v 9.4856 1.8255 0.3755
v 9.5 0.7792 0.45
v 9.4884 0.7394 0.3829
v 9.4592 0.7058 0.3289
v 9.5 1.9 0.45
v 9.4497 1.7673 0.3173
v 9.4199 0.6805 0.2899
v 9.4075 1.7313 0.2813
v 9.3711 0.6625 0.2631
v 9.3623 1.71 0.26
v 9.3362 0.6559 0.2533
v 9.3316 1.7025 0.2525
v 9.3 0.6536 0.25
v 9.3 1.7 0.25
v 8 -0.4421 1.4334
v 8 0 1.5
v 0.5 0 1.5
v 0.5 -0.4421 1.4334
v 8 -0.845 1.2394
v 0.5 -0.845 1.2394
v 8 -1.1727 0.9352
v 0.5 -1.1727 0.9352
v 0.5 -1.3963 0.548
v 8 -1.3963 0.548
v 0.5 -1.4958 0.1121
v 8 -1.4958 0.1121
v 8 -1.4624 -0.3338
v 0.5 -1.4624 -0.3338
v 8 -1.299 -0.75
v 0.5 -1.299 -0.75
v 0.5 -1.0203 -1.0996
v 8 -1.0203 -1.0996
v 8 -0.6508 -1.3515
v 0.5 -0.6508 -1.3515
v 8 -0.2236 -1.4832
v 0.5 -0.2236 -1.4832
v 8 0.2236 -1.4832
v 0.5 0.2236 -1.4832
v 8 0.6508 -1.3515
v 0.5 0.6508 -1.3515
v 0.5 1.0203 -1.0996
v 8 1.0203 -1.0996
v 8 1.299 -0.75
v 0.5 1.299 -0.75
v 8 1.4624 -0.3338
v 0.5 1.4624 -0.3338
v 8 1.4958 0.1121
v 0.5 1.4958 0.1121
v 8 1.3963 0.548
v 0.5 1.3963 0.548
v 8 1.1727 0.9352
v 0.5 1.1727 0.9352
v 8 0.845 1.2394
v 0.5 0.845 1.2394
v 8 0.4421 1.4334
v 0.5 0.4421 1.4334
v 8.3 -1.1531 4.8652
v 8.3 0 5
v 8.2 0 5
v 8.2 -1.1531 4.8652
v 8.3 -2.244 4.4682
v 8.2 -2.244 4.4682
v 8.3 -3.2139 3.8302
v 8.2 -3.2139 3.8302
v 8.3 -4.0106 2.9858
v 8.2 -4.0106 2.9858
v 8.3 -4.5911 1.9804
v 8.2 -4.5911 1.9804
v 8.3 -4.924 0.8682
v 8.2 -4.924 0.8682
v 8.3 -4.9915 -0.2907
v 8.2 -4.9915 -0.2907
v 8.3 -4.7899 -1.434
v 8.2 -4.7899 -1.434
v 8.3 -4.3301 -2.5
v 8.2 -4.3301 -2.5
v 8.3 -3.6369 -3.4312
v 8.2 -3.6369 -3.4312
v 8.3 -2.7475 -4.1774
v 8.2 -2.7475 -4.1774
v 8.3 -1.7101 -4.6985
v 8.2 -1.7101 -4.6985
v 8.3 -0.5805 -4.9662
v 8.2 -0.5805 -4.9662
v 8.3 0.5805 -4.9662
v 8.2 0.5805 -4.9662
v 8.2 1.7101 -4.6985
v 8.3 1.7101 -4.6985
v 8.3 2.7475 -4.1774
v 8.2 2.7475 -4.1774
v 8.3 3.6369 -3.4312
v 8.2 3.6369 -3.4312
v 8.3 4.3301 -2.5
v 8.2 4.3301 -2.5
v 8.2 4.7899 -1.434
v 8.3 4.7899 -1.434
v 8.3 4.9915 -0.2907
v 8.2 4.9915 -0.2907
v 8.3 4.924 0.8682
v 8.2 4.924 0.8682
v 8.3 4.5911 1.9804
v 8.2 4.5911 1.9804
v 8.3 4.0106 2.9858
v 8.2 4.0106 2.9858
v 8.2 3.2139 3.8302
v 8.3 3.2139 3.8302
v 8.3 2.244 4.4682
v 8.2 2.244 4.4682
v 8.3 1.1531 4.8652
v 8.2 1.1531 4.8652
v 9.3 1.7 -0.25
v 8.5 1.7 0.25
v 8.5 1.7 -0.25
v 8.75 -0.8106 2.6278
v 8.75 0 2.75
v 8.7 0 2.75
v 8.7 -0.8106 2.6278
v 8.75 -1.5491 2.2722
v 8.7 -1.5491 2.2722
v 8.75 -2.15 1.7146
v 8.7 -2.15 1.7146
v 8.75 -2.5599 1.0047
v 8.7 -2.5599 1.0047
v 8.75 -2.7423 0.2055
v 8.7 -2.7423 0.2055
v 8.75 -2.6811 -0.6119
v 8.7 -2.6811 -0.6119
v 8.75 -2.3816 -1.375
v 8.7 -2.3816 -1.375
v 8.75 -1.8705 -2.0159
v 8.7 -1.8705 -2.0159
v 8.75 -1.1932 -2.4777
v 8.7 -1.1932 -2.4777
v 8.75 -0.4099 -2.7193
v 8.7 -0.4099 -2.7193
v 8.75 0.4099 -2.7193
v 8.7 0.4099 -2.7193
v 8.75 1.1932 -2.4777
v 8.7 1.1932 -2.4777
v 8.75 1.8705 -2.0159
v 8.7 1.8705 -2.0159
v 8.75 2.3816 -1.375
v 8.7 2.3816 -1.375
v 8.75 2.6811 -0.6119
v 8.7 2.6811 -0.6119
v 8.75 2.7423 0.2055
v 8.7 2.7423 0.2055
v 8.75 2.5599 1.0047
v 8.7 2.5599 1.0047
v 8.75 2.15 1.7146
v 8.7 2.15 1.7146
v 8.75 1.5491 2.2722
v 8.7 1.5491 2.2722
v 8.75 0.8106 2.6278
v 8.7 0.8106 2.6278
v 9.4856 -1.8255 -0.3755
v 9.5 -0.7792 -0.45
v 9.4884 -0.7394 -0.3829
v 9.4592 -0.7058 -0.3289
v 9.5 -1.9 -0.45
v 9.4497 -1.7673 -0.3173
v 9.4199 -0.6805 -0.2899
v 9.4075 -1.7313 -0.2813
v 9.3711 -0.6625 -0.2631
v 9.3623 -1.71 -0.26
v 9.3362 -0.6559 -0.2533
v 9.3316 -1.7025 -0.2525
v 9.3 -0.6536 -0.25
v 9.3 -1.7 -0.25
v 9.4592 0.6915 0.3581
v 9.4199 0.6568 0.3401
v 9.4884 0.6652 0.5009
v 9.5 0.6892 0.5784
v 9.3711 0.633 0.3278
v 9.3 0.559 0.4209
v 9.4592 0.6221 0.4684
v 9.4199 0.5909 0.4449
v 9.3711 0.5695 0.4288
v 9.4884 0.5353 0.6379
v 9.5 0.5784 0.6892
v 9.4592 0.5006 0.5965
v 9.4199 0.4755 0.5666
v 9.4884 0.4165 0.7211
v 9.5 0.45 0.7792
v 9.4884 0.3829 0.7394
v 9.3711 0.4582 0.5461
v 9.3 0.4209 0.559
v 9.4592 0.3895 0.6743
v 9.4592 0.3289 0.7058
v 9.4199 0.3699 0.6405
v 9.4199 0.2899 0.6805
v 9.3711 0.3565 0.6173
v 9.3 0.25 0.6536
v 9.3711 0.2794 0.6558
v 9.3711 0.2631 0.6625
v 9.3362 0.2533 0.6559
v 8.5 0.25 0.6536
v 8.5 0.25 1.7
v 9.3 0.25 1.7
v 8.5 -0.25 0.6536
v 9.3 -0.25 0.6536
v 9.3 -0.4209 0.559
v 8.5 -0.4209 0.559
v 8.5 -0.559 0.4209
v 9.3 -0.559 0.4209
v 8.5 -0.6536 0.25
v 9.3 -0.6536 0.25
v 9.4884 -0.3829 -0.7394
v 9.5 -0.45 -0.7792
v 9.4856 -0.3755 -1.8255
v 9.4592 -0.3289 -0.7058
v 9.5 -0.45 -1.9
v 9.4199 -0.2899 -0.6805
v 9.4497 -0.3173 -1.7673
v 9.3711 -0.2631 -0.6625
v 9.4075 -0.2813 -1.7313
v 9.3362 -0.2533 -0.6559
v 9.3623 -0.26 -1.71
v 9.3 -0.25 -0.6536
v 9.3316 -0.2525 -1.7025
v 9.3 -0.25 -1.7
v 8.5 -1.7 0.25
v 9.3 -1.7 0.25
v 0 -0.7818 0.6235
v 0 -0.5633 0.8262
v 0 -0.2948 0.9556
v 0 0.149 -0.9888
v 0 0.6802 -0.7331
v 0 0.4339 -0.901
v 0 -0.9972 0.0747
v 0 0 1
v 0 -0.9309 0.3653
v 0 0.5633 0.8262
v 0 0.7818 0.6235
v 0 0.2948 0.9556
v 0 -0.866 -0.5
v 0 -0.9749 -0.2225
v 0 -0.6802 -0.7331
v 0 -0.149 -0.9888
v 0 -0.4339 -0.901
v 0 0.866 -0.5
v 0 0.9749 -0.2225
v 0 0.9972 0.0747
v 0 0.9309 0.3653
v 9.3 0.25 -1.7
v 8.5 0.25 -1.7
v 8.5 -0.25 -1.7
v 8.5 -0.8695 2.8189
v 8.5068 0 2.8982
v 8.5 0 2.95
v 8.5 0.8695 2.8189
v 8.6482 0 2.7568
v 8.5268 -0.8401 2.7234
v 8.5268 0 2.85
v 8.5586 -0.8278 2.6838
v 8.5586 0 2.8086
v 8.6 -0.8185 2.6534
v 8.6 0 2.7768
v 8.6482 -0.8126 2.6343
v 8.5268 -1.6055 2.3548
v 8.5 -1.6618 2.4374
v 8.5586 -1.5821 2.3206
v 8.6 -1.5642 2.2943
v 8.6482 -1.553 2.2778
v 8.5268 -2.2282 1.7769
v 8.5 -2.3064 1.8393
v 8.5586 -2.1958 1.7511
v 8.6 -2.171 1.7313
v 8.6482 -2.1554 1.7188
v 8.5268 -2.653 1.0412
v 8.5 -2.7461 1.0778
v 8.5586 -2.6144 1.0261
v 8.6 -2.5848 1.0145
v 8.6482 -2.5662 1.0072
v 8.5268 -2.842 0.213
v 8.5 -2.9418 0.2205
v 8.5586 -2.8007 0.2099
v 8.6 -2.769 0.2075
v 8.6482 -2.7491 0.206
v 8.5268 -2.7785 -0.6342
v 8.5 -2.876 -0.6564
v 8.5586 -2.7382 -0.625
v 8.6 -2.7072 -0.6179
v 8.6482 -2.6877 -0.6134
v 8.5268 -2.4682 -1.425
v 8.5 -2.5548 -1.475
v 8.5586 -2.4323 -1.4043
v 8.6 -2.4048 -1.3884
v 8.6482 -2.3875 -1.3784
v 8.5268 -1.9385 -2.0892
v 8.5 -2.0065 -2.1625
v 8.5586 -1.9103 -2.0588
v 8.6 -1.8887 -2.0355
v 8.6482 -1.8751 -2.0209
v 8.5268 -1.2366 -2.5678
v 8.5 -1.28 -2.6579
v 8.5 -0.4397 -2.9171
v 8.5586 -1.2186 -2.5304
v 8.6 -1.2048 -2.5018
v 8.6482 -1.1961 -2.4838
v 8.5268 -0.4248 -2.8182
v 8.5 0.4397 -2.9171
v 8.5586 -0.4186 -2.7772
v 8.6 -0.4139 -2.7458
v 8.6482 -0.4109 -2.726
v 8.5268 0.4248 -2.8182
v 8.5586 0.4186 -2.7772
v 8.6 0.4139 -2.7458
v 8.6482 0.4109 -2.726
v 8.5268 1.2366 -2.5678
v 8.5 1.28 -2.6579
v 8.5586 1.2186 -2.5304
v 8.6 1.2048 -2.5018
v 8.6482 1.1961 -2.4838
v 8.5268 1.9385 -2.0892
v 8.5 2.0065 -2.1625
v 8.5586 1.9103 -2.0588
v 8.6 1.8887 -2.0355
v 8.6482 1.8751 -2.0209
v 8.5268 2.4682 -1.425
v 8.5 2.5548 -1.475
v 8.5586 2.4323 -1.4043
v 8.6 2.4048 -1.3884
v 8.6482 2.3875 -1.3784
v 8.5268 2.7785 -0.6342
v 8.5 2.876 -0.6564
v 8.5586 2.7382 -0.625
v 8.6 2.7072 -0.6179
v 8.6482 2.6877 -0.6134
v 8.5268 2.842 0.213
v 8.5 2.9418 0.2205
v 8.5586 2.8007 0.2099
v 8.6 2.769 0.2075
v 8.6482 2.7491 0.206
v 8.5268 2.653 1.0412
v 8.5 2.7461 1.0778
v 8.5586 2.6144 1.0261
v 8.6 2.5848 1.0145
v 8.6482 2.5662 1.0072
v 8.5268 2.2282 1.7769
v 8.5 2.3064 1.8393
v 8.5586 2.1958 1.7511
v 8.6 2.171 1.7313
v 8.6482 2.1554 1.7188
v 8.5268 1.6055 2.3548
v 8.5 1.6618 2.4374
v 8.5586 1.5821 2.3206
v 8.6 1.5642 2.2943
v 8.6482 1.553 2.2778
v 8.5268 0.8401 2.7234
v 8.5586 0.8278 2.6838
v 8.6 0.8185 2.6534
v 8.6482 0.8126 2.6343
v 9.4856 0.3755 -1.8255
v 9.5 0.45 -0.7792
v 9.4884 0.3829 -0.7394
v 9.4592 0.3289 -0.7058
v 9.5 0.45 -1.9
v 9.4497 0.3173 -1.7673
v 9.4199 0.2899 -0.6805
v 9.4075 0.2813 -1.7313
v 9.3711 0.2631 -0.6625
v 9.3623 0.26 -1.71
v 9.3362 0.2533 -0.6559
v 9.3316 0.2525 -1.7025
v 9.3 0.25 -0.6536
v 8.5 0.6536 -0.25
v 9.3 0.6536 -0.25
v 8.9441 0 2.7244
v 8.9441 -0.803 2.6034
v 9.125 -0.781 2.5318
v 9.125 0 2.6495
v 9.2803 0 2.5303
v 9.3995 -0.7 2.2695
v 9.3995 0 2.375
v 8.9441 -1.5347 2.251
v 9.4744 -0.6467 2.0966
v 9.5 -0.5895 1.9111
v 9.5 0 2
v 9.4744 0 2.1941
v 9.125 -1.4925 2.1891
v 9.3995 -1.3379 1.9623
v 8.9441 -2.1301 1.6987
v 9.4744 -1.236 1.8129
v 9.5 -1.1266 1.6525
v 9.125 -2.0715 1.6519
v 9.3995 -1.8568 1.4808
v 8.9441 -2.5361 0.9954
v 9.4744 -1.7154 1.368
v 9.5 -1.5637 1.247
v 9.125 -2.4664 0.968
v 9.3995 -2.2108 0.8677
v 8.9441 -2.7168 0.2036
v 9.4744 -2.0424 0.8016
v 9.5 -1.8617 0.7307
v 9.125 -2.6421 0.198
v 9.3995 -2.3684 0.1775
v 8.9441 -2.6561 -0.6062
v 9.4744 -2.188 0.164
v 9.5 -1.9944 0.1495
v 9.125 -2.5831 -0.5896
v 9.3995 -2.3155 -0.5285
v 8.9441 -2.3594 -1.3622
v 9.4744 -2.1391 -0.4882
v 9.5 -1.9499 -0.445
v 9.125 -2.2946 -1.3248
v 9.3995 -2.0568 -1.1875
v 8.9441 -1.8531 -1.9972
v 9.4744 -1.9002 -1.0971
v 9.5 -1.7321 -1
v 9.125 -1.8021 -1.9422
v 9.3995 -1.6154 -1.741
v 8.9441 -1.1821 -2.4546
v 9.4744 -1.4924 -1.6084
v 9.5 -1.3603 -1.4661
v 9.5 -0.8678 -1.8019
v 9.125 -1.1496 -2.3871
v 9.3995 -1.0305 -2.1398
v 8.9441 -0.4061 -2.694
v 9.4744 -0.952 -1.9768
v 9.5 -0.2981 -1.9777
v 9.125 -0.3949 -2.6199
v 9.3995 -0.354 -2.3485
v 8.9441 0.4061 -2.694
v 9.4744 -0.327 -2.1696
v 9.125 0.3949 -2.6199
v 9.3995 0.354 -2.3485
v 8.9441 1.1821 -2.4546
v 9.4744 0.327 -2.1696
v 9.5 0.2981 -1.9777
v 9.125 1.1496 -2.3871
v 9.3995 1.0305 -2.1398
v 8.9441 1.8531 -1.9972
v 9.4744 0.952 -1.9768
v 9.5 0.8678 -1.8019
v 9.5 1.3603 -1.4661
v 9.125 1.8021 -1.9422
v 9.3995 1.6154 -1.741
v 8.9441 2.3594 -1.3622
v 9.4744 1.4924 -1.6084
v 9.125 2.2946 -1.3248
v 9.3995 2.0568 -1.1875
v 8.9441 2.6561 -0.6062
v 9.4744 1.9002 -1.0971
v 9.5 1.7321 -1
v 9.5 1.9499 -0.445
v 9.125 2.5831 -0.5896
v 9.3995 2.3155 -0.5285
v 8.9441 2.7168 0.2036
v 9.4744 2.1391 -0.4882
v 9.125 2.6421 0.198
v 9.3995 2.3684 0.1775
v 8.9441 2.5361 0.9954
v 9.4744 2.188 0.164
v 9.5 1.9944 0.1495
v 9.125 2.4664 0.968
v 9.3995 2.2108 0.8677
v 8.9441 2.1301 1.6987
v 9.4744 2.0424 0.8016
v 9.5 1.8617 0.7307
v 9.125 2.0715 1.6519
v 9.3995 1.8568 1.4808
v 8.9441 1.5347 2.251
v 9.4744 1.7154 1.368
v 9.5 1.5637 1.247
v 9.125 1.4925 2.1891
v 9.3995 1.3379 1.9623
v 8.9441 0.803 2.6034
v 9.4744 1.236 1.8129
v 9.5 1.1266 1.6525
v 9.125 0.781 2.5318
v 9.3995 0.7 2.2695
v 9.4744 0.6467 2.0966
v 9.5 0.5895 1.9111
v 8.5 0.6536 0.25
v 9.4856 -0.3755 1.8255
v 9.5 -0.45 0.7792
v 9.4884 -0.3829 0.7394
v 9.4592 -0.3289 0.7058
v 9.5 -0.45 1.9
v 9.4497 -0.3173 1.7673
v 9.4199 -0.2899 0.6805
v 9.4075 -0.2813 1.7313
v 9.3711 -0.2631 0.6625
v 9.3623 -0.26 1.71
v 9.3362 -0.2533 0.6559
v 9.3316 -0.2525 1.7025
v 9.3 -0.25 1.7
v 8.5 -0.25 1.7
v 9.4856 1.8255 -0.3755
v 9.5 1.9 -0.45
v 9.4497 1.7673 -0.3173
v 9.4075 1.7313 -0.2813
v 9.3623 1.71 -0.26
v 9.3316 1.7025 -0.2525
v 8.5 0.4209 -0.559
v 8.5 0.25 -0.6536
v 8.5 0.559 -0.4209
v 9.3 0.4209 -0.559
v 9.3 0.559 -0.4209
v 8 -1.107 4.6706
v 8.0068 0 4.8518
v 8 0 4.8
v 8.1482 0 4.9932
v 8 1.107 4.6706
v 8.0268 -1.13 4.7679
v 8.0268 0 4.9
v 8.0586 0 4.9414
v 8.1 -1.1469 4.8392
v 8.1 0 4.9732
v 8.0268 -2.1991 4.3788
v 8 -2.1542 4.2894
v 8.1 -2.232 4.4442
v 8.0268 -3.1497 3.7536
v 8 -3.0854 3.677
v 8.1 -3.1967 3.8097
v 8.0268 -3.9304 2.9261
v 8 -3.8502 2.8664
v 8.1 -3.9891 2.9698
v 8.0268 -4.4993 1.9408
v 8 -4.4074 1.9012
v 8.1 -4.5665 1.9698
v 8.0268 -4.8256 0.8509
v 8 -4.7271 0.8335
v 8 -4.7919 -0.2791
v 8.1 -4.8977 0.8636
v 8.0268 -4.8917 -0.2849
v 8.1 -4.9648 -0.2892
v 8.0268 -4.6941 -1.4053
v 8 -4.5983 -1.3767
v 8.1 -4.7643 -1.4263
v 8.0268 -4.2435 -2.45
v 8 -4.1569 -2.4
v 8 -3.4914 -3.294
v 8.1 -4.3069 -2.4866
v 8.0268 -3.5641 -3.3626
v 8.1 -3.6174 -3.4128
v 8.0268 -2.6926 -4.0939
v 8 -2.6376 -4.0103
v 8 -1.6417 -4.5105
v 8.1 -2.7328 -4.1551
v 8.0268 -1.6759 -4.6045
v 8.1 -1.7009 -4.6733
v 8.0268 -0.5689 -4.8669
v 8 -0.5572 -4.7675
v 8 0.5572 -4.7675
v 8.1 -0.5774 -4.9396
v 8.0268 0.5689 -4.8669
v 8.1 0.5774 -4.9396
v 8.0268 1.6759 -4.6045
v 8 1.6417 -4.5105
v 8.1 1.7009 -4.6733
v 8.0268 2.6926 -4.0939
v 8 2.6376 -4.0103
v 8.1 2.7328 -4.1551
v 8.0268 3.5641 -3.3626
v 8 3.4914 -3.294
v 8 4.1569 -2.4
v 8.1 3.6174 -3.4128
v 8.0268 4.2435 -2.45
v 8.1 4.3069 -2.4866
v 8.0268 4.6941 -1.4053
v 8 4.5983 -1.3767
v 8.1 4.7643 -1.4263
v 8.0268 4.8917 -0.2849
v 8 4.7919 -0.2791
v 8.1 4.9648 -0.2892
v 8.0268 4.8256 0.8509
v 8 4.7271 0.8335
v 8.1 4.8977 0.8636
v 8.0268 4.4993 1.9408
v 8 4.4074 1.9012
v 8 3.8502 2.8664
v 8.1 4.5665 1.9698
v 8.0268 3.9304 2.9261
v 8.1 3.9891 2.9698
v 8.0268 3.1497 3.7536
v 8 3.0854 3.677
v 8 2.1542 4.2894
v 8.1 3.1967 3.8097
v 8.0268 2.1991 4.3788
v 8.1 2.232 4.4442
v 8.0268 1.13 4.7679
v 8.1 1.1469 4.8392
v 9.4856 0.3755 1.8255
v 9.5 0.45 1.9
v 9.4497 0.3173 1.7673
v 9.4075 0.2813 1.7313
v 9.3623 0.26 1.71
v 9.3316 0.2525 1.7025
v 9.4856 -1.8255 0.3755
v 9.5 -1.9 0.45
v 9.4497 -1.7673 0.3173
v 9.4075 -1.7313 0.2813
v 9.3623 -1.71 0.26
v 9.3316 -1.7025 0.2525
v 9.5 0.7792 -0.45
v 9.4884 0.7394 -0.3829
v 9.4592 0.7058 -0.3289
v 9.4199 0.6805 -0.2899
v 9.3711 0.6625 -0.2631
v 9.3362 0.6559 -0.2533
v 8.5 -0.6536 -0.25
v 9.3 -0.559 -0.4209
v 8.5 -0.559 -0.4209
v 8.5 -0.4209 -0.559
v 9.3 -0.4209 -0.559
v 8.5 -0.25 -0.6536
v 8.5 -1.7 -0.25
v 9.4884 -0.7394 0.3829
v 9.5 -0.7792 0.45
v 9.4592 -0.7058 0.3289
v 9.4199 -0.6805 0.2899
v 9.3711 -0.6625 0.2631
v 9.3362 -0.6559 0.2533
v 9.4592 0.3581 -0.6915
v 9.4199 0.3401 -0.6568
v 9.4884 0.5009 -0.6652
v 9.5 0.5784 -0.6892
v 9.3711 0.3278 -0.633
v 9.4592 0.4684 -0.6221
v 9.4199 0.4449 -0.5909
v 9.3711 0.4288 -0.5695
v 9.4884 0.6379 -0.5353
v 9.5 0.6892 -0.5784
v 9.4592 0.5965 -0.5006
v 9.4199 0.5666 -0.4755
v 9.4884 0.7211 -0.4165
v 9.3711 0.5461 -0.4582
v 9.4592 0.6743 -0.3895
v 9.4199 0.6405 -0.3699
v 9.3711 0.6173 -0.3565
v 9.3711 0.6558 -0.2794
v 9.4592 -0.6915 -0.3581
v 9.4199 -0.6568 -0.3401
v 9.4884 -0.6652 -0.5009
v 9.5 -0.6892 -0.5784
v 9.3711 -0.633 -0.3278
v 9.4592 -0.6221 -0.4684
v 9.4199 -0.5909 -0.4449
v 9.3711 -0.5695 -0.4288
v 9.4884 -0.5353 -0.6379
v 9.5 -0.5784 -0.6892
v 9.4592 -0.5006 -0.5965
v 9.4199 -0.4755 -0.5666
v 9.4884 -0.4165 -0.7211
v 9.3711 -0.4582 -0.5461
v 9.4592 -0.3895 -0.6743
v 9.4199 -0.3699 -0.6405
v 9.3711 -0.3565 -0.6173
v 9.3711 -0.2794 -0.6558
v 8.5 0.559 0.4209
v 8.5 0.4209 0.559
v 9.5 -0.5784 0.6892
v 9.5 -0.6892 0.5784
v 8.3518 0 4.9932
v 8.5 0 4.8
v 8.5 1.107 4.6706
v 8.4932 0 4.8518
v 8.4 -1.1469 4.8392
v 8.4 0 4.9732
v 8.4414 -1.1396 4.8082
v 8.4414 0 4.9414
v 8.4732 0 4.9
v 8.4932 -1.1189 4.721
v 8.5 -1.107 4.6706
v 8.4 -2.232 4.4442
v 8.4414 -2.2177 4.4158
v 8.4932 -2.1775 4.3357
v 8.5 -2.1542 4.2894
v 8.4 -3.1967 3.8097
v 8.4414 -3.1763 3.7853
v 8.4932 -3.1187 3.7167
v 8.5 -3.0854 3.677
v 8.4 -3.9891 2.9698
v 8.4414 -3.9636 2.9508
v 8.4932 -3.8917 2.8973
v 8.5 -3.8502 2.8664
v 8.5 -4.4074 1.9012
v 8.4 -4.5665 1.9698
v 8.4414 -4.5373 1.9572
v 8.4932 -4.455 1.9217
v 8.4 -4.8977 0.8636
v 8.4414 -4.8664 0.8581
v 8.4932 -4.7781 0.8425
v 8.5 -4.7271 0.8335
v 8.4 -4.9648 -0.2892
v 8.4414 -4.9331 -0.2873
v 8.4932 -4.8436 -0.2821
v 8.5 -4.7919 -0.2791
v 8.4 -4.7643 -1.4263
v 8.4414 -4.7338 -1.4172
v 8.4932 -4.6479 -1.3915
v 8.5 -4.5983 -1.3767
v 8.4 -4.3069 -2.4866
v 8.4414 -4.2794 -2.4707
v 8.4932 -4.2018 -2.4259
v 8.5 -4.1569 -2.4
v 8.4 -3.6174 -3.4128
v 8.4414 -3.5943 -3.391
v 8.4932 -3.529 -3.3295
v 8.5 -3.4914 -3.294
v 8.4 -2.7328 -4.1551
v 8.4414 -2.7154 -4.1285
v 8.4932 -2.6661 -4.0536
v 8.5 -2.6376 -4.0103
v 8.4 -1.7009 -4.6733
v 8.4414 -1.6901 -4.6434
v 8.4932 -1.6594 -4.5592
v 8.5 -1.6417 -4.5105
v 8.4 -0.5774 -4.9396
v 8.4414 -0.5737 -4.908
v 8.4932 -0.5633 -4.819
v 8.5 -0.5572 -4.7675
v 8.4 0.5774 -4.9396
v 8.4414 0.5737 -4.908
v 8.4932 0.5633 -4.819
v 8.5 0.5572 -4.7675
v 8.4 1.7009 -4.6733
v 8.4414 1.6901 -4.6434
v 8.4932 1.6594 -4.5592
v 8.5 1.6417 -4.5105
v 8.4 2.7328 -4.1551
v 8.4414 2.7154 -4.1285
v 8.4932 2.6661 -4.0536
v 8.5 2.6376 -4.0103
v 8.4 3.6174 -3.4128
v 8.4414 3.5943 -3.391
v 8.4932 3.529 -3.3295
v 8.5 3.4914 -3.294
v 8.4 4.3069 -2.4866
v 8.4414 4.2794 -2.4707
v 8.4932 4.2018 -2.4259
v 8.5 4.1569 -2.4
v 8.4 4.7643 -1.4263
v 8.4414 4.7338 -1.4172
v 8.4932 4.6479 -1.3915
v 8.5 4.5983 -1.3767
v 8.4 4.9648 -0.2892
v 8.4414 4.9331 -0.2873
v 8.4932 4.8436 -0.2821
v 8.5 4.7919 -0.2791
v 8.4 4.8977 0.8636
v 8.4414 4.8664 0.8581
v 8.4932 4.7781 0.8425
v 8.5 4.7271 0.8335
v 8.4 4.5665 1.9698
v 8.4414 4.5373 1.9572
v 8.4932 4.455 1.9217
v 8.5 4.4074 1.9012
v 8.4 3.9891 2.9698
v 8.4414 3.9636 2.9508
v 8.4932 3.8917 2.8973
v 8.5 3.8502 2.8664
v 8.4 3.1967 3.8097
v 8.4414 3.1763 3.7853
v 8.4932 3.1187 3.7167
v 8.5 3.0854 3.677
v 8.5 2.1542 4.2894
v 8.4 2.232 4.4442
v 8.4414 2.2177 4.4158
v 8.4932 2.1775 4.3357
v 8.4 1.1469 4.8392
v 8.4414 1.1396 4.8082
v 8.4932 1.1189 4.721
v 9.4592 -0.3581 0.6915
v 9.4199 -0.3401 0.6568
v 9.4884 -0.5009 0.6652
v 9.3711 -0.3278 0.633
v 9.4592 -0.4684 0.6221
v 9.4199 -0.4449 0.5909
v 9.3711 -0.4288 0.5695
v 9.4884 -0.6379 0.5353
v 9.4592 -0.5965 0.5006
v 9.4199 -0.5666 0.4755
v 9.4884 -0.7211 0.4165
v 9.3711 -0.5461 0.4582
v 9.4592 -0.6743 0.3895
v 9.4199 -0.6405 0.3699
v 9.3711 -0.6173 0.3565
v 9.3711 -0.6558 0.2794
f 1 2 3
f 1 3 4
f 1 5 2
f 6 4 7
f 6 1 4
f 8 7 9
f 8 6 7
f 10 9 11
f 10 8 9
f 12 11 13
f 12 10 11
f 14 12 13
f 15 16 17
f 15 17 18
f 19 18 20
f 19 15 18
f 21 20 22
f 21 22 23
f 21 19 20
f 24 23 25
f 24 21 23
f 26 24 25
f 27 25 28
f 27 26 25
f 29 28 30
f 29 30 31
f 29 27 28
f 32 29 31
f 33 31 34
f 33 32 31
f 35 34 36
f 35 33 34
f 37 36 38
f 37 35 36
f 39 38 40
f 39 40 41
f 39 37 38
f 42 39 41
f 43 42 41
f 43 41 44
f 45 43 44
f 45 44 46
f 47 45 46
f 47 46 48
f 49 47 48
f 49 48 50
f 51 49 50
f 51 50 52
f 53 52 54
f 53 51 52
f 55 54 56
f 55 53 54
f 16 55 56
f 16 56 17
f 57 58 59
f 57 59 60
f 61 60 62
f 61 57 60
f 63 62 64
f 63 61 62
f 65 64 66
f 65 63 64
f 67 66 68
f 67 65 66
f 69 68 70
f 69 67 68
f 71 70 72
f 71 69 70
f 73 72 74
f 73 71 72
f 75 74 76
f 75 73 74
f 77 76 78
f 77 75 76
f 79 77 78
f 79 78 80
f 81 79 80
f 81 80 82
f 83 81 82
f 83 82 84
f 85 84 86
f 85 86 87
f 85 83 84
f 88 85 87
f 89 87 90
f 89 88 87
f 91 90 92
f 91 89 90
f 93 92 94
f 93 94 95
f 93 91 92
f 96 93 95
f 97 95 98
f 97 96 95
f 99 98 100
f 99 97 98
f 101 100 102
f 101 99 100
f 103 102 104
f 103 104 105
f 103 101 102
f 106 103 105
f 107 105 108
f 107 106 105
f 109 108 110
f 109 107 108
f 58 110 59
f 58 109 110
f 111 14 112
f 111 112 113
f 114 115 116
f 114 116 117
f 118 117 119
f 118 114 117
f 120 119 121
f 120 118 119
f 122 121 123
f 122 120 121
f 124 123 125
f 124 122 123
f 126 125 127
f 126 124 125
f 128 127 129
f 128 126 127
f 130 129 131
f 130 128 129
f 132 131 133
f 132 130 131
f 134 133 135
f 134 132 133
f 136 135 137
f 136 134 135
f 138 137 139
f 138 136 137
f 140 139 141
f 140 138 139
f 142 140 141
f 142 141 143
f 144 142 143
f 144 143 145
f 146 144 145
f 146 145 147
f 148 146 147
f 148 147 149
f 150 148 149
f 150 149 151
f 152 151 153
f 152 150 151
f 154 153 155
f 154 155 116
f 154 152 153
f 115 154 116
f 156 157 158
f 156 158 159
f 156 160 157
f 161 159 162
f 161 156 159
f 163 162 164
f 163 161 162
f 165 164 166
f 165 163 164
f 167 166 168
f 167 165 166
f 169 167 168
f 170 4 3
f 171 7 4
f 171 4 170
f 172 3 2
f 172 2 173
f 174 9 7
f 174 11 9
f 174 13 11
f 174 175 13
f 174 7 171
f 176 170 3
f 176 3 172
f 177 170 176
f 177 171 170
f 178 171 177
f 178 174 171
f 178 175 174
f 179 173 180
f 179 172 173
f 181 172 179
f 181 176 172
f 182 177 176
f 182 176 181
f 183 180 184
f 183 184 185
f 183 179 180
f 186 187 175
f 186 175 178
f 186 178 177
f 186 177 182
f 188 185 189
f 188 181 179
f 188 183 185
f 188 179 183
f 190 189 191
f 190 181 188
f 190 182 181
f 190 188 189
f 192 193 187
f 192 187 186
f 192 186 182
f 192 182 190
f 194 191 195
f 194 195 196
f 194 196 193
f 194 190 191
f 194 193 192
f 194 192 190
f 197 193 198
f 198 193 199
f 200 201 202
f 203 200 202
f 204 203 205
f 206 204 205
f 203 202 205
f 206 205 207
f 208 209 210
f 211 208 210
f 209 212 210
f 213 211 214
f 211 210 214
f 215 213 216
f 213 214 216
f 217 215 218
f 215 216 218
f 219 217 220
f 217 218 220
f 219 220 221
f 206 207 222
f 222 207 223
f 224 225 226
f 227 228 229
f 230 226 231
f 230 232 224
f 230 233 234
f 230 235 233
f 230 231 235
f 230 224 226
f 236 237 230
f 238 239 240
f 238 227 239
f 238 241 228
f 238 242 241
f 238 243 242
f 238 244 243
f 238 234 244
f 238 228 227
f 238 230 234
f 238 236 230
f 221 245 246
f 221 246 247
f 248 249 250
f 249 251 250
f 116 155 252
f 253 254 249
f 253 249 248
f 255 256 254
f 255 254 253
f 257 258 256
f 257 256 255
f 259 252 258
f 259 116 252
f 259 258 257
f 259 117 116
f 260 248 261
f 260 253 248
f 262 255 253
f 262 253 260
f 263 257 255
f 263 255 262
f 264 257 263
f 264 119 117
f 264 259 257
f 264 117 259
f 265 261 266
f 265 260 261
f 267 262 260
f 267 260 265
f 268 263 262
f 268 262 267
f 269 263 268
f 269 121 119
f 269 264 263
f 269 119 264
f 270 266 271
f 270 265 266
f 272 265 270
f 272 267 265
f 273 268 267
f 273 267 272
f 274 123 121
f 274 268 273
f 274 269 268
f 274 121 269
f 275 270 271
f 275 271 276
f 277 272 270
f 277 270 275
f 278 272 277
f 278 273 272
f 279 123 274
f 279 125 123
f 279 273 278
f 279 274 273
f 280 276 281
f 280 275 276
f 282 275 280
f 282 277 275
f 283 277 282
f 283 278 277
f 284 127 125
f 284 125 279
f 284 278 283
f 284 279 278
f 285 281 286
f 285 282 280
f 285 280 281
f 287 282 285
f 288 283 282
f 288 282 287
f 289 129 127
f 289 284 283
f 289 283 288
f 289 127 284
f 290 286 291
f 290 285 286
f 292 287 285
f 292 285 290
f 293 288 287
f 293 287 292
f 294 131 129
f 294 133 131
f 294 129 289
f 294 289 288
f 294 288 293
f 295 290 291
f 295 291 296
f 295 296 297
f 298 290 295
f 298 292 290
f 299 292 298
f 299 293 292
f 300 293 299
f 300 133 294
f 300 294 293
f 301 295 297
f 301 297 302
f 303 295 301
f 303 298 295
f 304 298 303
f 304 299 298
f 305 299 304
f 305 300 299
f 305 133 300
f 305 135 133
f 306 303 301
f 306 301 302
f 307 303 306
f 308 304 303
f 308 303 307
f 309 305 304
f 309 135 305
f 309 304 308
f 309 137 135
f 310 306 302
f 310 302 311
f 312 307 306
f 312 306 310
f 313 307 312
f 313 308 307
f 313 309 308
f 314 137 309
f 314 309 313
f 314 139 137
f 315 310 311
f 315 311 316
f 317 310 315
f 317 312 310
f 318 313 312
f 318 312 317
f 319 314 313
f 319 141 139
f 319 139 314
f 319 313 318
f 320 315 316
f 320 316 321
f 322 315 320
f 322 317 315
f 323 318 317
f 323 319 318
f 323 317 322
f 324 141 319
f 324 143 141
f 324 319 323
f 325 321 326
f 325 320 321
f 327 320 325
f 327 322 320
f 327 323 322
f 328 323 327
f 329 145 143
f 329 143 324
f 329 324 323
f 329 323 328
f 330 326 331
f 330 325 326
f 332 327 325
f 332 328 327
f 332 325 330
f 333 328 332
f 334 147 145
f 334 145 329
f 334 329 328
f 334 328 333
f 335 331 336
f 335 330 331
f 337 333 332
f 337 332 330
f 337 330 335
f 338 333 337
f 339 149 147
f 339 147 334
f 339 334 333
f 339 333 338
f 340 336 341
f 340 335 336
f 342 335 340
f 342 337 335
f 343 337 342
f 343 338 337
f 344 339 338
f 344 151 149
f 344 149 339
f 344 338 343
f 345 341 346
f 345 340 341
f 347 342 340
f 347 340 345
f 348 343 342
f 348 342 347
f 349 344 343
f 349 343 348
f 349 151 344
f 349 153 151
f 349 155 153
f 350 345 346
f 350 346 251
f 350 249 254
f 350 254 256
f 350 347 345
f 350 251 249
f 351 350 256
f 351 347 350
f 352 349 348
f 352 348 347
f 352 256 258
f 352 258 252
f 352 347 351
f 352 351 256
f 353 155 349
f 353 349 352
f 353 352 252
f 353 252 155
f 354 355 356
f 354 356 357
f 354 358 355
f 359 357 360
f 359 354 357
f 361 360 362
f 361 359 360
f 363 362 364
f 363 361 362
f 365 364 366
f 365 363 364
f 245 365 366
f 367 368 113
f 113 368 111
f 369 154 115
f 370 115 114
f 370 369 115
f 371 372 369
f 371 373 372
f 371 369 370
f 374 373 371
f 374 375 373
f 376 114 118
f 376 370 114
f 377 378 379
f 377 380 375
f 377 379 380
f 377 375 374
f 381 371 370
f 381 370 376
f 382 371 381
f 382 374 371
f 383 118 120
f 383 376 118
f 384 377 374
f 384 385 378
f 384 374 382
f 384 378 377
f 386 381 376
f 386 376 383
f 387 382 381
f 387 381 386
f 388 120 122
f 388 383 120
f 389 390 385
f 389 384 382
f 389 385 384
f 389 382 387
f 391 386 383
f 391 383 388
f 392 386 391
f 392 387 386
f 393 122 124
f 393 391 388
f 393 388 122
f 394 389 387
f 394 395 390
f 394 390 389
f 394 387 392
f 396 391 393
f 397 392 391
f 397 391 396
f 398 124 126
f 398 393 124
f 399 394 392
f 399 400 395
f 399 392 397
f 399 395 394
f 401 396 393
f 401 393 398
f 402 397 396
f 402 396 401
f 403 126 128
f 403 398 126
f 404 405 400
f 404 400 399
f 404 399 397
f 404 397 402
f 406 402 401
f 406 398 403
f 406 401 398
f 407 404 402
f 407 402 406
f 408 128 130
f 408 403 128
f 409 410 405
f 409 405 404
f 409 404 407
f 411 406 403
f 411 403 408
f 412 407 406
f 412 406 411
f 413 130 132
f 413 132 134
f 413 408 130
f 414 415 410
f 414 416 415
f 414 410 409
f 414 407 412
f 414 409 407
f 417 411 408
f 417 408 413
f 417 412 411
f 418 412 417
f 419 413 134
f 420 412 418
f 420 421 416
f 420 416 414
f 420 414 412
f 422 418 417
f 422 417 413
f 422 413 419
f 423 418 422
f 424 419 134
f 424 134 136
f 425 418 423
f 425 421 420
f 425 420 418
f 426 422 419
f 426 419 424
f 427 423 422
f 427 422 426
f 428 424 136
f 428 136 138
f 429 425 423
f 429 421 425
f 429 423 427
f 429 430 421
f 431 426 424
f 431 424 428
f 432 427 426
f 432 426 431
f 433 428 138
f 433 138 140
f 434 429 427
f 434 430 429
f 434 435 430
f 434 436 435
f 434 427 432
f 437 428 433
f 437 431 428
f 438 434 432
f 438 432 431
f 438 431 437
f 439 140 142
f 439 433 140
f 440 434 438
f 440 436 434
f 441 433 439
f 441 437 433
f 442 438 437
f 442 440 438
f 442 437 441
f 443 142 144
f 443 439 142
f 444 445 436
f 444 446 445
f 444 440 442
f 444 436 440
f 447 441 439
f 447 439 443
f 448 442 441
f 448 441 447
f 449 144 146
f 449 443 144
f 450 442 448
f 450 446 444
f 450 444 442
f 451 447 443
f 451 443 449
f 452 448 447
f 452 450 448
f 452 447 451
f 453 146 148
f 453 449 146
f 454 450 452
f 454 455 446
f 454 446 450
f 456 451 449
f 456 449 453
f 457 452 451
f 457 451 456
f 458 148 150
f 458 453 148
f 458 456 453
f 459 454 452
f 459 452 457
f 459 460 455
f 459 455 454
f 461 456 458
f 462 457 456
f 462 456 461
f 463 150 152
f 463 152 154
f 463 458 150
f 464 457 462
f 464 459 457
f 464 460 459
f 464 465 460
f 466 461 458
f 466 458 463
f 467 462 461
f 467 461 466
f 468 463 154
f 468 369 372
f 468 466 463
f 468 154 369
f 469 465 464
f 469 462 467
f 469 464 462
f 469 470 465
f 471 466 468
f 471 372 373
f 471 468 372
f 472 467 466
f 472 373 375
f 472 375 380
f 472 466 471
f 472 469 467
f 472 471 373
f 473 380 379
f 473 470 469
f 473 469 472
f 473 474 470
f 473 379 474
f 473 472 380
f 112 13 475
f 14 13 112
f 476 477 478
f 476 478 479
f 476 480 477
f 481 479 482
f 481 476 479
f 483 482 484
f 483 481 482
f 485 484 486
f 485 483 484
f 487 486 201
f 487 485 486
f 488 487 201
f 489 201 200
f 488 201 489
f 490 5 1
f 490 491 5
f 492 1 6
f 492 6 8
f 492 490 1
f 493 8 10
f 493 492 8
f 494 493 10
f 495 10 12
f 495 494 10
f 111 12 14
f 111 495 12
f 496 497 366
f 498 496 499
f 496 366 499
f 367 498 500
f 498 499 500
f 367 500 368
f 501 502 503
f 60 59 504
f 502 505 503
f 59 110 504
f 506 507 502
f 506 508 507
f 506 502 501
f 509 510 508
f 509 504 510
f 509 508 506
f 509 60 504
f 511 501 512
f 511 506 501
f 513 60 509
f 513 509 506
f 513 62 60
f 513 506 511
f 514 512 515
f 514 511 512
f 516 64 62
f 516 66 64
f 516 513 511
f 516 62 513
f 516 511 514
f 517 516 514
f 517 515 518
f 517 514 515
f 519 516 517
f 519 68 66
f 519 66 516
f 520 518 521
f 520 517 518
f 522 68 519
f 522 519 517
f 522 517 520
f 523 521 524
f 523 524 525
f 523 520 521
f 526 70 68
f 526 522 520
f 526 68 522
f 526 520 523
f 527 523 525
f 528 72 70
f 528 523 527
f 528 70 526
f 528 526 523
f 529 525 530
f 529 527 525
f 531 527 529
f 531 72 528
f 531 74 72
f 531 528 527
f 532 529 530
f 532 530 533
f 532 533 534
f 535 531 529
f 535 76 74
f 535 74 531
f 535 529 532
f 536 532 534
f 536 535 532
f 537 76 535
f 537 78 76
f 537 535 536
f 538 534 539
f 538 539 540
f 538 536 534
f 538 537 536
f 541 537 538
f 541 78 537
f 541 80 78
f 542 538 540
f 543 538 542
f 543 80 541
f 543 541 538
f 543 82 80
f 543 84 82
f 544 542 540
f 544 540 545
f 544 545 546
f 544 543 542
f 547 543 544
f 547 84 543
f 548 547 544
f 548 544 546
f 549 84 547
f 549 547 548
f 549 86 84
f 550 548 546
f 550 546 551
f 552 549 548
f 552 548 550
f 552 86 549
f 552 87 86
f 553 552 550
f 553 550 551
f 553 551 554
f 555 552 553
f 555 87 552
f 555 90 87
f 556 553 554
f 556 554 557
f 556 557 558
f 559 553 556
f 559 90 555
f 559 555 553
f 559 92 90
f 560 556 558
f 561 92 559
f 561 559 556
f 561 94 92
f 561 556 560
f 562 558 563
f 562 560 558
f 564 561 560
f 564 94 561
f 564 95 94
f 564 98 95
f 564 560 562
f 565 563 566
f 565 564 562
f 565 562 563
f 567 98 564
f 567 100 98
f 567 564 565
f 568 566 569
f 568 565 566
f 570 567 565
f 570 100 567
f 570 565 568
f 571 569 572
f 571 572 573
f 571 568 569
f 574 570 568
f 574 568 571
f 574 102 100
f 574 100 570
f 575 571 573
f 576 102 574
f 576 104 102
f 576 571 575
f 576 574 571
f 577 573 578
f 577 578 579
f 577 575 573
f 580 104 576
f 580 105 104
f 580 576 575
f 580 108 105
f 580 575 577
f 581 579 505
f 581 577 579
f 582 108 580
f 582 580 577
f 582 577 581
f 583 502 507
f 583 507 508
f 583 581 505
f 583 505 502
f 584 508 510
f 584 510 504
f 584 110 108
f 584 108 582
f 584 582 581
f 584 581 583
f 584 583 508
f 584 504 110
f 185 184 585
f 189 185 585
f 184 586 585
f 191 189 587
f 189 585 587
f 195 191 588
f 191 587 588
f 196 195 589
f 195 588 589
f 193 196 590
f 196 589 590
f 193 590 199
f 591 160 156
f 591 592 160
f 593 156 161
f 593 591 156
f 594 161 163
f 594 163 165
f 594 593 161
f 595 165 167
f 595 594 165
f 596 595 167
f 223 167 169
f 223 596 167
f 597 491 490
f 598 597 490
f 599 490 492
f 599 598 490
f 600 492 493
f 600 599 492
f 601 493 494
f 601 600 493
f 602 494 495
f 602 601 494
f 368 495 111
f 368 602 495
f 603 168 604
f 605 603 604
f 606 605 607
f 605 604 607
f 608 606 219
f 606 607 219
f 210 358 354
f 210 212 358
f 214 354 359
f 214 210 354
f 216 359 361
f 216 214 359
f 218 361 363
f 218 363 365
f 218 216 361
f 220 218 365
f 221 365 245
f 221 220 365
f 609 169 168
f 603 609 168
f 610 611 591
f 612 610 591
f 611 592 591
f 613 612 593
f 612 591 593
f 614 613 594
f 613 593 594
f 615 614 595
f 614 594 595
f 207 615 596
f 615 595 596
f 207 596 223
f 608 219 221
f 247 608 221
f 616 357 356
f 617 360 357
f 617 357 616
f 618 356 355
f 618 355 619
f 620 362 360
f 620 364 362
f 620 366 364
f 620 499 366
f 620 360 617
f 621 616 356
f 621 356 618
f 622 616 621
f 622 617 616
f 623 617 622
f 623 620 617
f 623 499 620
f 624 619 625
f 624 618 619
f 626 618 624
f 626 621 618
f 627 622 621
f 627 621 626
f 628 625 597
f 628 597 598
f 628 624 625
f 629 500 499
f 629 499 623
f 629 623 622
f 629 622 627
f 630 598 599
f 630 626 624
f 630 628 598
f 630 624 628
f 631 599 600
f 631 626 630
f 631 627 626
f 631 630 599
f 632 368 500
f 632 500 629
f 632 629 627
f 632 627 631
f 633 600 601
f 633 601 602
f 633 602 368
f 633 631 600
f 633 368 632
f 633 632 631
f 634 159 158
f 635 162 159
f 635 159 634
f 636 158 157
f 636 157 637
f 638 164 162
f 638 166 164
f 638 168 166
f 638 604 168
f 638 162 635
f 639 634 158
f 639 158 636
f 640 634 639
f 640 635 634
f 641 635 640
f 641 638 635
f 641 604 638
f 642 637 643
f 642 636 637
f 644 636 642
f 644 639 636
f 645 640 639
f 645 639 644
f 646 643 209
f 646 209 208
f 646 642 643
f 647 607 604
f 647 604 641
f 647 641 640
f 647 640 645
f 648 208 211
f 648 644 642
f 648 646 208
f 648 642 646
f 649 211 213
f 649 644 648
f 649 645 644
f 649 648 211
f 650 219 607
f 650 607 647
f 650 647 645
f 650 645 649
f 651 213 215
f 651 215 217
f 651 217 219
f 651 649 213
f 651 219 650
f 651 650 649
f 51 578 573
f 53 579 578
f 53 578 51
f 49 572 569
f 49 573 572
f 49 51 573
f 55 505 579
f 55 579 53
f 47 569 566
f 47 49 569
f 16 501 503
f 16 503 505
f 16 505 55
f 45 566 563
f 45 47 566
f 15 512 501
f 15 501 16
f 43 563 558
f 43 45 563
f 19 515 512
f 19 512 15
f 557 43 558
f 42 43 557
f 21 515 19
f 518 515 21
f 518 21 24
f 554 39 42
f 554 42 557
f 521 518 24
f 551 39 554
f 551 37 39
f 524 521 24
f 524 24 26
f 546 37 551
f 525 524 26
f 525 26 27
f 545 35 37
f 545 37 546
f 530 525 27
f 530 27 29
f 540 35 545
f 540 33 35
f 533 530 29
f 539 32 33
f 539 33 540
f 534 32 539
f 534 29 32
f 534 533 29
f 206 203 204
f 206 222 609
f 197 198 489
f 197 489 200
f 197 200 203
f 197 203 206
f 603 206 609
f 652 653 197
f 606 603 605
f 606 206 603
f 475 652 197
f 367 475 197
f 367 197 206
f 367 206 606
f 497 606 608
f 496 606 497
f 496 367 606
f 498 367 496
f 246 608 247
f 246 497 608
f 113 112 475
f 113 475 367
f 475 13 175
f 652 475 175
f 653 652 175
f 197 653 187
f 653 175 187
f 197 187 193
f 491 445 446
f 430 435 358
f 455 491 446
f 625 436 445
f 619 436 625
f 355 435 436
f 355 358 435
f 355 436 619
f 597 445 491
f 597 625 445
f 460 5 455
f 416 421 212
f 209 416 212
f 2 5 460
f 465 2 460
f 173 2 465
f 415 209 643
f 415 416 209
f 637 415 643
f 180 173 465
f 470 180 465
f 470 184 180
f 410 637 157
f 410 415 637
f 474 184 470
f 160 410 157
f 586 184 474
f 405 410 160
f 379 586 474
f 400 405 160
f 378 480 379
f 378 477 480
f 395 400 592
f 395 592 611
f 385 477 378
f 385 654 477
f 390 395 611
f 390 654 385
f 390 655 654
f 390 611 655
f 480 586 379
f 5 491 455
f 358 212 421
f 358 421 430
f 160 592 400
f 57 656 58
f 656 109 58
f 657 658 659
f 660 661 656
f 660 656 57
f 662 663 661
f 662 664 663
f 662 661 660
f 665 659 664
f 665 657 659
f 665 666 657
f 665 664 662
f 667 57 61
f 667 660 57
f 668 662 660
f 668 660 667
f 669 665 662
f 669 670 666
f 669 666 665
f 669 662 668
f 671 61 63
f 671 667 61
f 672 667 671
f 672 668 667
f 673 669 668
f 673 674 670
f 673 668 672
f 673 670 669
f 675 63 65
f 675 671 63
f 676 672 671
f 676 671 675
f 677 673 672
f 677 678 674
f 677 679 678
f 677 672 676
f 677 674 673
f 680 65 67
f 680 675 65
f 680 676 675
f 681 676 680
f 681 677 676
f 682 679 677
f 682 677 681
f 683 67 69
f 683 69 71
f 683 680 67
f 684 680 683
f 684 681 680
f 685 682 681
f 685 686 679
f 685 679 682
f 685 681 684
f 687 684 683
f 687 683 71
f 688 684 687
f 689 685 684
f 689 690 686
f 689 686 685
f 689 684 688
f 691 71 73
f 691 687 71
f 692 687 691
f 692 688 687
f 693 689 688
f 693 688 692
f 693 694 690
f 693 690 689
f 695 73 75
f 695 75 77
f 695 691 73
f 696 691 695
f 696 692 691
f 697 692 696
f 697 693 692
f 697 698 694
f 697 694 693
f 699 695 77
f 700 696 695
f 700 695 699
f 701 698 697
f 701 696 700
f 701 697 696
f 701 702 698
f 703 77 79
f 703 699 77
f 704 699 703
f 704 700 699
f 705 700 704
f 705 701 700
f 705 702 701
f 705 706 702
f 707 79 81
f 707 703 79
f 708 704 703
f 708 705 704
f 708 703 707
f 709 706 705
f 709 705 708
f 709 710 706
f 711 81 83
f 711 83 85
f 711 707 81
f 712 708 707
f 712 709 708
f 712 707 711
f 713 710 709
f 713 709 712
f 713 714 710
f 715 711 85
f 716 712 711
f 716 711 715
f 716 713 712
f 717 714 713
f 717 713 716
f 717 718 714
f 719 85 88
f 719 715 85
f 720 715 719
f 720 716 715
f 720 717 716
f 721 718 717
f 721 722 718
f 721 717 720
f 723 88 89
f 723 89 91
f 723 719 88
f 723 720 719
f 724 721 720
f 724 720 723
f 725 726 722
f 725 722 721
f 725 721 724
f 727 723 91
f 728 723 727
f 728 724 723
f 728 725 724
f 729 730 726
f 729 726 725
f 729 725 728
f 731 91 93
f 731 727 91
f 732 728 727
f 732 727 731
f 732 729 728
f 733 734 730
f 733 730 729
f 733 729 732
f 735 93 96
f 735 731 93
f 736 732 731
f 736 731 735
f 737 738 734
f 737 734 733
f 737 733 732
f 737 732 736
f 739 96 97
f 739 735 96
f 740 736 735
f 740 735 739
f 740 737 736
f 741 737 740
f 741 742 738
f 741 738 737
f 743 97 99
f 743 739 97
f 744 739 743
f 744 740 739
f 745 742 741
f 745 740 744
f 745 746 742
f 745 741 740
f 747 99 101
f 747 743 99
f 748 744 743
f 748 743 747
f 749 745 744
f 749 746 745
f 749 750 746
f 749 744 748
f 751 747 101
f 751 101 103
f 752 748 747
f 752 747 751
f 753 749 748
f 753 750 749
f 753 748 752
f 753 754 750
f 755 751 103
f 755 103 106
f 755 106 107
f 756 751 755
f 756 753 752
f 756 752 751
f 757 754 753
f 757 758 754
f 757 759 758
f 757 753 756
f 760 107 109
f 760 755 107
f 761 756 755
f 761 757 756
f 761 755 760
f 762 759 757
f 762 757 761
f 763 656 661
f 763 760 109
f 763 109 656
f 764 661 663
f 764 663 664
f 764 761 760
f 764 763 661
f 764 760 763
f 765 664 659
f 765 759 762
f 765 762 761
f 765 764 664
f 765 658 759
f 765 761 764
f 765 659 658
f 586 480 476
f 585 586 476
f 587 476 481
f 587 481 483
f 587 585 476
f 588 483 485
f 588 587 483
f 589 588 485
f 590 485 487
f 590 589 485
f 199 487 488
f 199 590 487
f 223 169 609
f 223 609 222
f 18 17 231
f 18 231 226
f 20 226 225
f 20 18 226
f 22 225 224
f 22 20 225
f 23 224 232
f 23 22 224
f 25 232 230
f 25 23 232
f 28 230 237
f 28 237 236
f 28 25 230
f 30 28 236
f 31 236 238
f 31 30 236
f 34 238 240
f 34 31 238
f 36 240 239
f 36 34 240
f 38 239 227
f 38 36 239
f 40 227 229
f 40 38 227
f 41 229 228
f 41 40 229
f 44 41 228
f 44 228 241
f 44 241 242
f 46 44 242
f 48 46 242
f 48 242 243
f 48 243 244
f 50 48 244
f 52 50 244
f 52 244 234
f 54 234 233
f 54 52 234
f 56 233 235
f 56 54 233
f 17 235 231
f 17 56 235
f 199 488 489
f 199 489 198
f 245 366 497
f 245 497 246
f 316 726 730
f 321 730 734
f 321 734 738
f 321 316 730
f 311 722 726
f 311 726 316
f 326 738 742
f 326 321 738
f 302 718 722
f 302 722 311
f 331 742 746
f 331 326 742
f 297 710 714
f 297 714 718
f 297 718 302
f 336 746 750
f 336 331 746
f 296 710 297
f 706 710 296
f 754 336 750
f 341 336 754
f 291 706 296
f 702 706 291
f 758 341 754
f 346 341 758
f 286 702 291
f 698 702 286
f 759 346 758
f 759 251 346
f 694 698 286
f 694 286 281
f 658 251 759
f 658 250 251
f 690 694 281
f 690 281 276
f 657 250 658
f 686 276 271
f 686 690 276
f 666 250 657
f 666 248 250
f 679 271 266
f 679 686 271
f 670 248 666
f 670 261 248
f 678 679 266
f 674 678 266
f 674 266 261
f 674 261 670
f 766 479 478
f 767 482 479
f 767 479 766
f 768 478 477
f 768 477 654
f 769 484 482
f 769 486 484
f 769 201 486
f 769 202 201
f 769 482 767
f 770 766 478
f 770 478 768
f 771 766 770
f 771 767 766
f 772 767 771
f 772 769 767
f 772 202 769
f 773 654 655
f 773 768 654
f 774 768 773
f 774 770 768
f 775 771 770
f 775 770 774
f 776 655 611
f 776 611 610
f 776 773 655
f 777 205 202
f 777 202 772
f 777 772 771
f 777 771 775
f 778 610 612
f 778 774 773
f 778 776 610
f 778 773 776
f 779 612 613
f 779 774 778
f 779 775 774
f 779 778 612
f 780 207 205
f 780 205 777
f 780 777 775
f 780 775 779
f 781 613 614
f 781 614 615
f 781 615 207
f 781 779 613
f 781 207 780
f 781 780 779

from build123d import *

# Parameters (mm, degrees)
ESQUISSE2_W                  = 0.5
ESQUISSE2_H                  = 1.7
ENL_V_MAT_EXTRU_1_DEPTH      = 1
R_P_TITION_CIRCULAIRE1_COUNT = 4
ESQUISSE3_R                  = 0.699771755
ENL_V_MAT_EXTRU_2_DEPTH      = 1
CHANFREIN1_SIZE              = 0.5
CONG_1_R                     = 0.2


with BuildPart() as part:
    # Esquisse1 → Révolution1 (revolve)
    with BuildSketch(Plane.XY, mode=Mode.PRIVATE) as r_volution1_sk:
        with BuildLine():
            Line((0, 0), (0, 1.5))
            Line((0, 1.5), (8, 1.5))
            Line((8, 1.5), (8, 5))
            Line((8, 5), (8.5, 5))
            Line((8.5, 5), (8.5, 2.75))
            Line((8.5, 2.75), (8.75, 2.75))
            ThreePointArc((8.75, 2.75), (9.280330086, 2.530330086), (9.5, 2))
            Line((9.5, 2), (9.5, 0))
            Line((9.5, 0), (0, 0))
        make_face()
    revolve(r_volution1_sk.sketch.rotate(Axis((0, 0, 0), (1, 0, 0)), 90), axis=Axis((0, 0, 0), (1, 0, 0)))

    # Esquisse2 → Enlèv. mat.-Extru.1 (cut)
    with BuildSketch(Plane(origin=(9.5, 0, 0), x_dir=(0, 0, -1), z_dir=(1, 0, 0))):
        with Locations((0, 0.85)):
            Rectangle(ESQUISSE2_W, ESQUISSE2_H)
    enl_v_mat_extru_1 = extrude(amount=-ENL_V_MAT_EXTRU_1_DEPTH, mode=Mode.SUBTRACT)

    # Répétition circulaire1: Enlèv. mat.-Extru.1 ×4 about axis
    r_p_tition_circulaire1_axis = Axis((0, 0, 0), (1, 0, 0))
    for i in range(1, R_P_TITION_CIRCULAIRE1_COUNT):
        add(enl_v_mat_extru_1.rotate(r_p_tition_circulaire1_axis, i * 360 / R_P_TITION_CIRCULAIRE1_COUNT), mode=Mode.SUBTRACT)

    # Esquisse3 → Enlèv. mat.-Extru.2 (cut)
    with BuildSketch(Plane(origin=(9.5, 0, 0), x_dir=(0, 0, -1), z_dir=(1, 0, 0))):
        Circle(ESQUISSE3_R)
    extrude(amount=-ENL_V_MAT_EXTRU_2_DEPTH, mode=Mode.SUBTRACT)

    # Chanfrein1
    chanfrein1_edges = [part.edges().sort_by_distance(p)[0] for p in [
        (0, 0, -1.5),
    ]]
    chamfer(chanfrein1_edges, length=CHANFREIN1_SIZE)

    # Congé1
    cong_1_edges = [part.edges().sort_by_distance(p)[0] for p in [
        (8, 0, -5),
        (8.5, 0, -5),
        (8.5, 0, -2.75),
        (9.5, 0, 1.7),
        (9.5, -0.25, 1.176795238),
        (9.5, -0.494813353, 0.494813353),
        (9.5, -1.176795238, 0.25),
        (9.5, -1.7, 0),
        (9.5, -1.176795238, -0.25),
        (9.5, -0.494813353, -0.494813353),
        (9.5, -0.25, -1.176795238),
        (9.5, 0, -1.7),
        (9.5, 0.25, -1.176795238),
        (9.5, 0.494813353, -0.494813353),
        (9.5, 1.176795238, -0.25),
        (9.5, 1.7, 0),
        (9.5, 1.176795238, 0.25),
        (9.5, 0.494813353, 0.494813353),
        (9.5, 0.25, 1.176795238),
    ]]
    fillet(cong_1_edges, radius=CONG_1_R)


solid = part.part
